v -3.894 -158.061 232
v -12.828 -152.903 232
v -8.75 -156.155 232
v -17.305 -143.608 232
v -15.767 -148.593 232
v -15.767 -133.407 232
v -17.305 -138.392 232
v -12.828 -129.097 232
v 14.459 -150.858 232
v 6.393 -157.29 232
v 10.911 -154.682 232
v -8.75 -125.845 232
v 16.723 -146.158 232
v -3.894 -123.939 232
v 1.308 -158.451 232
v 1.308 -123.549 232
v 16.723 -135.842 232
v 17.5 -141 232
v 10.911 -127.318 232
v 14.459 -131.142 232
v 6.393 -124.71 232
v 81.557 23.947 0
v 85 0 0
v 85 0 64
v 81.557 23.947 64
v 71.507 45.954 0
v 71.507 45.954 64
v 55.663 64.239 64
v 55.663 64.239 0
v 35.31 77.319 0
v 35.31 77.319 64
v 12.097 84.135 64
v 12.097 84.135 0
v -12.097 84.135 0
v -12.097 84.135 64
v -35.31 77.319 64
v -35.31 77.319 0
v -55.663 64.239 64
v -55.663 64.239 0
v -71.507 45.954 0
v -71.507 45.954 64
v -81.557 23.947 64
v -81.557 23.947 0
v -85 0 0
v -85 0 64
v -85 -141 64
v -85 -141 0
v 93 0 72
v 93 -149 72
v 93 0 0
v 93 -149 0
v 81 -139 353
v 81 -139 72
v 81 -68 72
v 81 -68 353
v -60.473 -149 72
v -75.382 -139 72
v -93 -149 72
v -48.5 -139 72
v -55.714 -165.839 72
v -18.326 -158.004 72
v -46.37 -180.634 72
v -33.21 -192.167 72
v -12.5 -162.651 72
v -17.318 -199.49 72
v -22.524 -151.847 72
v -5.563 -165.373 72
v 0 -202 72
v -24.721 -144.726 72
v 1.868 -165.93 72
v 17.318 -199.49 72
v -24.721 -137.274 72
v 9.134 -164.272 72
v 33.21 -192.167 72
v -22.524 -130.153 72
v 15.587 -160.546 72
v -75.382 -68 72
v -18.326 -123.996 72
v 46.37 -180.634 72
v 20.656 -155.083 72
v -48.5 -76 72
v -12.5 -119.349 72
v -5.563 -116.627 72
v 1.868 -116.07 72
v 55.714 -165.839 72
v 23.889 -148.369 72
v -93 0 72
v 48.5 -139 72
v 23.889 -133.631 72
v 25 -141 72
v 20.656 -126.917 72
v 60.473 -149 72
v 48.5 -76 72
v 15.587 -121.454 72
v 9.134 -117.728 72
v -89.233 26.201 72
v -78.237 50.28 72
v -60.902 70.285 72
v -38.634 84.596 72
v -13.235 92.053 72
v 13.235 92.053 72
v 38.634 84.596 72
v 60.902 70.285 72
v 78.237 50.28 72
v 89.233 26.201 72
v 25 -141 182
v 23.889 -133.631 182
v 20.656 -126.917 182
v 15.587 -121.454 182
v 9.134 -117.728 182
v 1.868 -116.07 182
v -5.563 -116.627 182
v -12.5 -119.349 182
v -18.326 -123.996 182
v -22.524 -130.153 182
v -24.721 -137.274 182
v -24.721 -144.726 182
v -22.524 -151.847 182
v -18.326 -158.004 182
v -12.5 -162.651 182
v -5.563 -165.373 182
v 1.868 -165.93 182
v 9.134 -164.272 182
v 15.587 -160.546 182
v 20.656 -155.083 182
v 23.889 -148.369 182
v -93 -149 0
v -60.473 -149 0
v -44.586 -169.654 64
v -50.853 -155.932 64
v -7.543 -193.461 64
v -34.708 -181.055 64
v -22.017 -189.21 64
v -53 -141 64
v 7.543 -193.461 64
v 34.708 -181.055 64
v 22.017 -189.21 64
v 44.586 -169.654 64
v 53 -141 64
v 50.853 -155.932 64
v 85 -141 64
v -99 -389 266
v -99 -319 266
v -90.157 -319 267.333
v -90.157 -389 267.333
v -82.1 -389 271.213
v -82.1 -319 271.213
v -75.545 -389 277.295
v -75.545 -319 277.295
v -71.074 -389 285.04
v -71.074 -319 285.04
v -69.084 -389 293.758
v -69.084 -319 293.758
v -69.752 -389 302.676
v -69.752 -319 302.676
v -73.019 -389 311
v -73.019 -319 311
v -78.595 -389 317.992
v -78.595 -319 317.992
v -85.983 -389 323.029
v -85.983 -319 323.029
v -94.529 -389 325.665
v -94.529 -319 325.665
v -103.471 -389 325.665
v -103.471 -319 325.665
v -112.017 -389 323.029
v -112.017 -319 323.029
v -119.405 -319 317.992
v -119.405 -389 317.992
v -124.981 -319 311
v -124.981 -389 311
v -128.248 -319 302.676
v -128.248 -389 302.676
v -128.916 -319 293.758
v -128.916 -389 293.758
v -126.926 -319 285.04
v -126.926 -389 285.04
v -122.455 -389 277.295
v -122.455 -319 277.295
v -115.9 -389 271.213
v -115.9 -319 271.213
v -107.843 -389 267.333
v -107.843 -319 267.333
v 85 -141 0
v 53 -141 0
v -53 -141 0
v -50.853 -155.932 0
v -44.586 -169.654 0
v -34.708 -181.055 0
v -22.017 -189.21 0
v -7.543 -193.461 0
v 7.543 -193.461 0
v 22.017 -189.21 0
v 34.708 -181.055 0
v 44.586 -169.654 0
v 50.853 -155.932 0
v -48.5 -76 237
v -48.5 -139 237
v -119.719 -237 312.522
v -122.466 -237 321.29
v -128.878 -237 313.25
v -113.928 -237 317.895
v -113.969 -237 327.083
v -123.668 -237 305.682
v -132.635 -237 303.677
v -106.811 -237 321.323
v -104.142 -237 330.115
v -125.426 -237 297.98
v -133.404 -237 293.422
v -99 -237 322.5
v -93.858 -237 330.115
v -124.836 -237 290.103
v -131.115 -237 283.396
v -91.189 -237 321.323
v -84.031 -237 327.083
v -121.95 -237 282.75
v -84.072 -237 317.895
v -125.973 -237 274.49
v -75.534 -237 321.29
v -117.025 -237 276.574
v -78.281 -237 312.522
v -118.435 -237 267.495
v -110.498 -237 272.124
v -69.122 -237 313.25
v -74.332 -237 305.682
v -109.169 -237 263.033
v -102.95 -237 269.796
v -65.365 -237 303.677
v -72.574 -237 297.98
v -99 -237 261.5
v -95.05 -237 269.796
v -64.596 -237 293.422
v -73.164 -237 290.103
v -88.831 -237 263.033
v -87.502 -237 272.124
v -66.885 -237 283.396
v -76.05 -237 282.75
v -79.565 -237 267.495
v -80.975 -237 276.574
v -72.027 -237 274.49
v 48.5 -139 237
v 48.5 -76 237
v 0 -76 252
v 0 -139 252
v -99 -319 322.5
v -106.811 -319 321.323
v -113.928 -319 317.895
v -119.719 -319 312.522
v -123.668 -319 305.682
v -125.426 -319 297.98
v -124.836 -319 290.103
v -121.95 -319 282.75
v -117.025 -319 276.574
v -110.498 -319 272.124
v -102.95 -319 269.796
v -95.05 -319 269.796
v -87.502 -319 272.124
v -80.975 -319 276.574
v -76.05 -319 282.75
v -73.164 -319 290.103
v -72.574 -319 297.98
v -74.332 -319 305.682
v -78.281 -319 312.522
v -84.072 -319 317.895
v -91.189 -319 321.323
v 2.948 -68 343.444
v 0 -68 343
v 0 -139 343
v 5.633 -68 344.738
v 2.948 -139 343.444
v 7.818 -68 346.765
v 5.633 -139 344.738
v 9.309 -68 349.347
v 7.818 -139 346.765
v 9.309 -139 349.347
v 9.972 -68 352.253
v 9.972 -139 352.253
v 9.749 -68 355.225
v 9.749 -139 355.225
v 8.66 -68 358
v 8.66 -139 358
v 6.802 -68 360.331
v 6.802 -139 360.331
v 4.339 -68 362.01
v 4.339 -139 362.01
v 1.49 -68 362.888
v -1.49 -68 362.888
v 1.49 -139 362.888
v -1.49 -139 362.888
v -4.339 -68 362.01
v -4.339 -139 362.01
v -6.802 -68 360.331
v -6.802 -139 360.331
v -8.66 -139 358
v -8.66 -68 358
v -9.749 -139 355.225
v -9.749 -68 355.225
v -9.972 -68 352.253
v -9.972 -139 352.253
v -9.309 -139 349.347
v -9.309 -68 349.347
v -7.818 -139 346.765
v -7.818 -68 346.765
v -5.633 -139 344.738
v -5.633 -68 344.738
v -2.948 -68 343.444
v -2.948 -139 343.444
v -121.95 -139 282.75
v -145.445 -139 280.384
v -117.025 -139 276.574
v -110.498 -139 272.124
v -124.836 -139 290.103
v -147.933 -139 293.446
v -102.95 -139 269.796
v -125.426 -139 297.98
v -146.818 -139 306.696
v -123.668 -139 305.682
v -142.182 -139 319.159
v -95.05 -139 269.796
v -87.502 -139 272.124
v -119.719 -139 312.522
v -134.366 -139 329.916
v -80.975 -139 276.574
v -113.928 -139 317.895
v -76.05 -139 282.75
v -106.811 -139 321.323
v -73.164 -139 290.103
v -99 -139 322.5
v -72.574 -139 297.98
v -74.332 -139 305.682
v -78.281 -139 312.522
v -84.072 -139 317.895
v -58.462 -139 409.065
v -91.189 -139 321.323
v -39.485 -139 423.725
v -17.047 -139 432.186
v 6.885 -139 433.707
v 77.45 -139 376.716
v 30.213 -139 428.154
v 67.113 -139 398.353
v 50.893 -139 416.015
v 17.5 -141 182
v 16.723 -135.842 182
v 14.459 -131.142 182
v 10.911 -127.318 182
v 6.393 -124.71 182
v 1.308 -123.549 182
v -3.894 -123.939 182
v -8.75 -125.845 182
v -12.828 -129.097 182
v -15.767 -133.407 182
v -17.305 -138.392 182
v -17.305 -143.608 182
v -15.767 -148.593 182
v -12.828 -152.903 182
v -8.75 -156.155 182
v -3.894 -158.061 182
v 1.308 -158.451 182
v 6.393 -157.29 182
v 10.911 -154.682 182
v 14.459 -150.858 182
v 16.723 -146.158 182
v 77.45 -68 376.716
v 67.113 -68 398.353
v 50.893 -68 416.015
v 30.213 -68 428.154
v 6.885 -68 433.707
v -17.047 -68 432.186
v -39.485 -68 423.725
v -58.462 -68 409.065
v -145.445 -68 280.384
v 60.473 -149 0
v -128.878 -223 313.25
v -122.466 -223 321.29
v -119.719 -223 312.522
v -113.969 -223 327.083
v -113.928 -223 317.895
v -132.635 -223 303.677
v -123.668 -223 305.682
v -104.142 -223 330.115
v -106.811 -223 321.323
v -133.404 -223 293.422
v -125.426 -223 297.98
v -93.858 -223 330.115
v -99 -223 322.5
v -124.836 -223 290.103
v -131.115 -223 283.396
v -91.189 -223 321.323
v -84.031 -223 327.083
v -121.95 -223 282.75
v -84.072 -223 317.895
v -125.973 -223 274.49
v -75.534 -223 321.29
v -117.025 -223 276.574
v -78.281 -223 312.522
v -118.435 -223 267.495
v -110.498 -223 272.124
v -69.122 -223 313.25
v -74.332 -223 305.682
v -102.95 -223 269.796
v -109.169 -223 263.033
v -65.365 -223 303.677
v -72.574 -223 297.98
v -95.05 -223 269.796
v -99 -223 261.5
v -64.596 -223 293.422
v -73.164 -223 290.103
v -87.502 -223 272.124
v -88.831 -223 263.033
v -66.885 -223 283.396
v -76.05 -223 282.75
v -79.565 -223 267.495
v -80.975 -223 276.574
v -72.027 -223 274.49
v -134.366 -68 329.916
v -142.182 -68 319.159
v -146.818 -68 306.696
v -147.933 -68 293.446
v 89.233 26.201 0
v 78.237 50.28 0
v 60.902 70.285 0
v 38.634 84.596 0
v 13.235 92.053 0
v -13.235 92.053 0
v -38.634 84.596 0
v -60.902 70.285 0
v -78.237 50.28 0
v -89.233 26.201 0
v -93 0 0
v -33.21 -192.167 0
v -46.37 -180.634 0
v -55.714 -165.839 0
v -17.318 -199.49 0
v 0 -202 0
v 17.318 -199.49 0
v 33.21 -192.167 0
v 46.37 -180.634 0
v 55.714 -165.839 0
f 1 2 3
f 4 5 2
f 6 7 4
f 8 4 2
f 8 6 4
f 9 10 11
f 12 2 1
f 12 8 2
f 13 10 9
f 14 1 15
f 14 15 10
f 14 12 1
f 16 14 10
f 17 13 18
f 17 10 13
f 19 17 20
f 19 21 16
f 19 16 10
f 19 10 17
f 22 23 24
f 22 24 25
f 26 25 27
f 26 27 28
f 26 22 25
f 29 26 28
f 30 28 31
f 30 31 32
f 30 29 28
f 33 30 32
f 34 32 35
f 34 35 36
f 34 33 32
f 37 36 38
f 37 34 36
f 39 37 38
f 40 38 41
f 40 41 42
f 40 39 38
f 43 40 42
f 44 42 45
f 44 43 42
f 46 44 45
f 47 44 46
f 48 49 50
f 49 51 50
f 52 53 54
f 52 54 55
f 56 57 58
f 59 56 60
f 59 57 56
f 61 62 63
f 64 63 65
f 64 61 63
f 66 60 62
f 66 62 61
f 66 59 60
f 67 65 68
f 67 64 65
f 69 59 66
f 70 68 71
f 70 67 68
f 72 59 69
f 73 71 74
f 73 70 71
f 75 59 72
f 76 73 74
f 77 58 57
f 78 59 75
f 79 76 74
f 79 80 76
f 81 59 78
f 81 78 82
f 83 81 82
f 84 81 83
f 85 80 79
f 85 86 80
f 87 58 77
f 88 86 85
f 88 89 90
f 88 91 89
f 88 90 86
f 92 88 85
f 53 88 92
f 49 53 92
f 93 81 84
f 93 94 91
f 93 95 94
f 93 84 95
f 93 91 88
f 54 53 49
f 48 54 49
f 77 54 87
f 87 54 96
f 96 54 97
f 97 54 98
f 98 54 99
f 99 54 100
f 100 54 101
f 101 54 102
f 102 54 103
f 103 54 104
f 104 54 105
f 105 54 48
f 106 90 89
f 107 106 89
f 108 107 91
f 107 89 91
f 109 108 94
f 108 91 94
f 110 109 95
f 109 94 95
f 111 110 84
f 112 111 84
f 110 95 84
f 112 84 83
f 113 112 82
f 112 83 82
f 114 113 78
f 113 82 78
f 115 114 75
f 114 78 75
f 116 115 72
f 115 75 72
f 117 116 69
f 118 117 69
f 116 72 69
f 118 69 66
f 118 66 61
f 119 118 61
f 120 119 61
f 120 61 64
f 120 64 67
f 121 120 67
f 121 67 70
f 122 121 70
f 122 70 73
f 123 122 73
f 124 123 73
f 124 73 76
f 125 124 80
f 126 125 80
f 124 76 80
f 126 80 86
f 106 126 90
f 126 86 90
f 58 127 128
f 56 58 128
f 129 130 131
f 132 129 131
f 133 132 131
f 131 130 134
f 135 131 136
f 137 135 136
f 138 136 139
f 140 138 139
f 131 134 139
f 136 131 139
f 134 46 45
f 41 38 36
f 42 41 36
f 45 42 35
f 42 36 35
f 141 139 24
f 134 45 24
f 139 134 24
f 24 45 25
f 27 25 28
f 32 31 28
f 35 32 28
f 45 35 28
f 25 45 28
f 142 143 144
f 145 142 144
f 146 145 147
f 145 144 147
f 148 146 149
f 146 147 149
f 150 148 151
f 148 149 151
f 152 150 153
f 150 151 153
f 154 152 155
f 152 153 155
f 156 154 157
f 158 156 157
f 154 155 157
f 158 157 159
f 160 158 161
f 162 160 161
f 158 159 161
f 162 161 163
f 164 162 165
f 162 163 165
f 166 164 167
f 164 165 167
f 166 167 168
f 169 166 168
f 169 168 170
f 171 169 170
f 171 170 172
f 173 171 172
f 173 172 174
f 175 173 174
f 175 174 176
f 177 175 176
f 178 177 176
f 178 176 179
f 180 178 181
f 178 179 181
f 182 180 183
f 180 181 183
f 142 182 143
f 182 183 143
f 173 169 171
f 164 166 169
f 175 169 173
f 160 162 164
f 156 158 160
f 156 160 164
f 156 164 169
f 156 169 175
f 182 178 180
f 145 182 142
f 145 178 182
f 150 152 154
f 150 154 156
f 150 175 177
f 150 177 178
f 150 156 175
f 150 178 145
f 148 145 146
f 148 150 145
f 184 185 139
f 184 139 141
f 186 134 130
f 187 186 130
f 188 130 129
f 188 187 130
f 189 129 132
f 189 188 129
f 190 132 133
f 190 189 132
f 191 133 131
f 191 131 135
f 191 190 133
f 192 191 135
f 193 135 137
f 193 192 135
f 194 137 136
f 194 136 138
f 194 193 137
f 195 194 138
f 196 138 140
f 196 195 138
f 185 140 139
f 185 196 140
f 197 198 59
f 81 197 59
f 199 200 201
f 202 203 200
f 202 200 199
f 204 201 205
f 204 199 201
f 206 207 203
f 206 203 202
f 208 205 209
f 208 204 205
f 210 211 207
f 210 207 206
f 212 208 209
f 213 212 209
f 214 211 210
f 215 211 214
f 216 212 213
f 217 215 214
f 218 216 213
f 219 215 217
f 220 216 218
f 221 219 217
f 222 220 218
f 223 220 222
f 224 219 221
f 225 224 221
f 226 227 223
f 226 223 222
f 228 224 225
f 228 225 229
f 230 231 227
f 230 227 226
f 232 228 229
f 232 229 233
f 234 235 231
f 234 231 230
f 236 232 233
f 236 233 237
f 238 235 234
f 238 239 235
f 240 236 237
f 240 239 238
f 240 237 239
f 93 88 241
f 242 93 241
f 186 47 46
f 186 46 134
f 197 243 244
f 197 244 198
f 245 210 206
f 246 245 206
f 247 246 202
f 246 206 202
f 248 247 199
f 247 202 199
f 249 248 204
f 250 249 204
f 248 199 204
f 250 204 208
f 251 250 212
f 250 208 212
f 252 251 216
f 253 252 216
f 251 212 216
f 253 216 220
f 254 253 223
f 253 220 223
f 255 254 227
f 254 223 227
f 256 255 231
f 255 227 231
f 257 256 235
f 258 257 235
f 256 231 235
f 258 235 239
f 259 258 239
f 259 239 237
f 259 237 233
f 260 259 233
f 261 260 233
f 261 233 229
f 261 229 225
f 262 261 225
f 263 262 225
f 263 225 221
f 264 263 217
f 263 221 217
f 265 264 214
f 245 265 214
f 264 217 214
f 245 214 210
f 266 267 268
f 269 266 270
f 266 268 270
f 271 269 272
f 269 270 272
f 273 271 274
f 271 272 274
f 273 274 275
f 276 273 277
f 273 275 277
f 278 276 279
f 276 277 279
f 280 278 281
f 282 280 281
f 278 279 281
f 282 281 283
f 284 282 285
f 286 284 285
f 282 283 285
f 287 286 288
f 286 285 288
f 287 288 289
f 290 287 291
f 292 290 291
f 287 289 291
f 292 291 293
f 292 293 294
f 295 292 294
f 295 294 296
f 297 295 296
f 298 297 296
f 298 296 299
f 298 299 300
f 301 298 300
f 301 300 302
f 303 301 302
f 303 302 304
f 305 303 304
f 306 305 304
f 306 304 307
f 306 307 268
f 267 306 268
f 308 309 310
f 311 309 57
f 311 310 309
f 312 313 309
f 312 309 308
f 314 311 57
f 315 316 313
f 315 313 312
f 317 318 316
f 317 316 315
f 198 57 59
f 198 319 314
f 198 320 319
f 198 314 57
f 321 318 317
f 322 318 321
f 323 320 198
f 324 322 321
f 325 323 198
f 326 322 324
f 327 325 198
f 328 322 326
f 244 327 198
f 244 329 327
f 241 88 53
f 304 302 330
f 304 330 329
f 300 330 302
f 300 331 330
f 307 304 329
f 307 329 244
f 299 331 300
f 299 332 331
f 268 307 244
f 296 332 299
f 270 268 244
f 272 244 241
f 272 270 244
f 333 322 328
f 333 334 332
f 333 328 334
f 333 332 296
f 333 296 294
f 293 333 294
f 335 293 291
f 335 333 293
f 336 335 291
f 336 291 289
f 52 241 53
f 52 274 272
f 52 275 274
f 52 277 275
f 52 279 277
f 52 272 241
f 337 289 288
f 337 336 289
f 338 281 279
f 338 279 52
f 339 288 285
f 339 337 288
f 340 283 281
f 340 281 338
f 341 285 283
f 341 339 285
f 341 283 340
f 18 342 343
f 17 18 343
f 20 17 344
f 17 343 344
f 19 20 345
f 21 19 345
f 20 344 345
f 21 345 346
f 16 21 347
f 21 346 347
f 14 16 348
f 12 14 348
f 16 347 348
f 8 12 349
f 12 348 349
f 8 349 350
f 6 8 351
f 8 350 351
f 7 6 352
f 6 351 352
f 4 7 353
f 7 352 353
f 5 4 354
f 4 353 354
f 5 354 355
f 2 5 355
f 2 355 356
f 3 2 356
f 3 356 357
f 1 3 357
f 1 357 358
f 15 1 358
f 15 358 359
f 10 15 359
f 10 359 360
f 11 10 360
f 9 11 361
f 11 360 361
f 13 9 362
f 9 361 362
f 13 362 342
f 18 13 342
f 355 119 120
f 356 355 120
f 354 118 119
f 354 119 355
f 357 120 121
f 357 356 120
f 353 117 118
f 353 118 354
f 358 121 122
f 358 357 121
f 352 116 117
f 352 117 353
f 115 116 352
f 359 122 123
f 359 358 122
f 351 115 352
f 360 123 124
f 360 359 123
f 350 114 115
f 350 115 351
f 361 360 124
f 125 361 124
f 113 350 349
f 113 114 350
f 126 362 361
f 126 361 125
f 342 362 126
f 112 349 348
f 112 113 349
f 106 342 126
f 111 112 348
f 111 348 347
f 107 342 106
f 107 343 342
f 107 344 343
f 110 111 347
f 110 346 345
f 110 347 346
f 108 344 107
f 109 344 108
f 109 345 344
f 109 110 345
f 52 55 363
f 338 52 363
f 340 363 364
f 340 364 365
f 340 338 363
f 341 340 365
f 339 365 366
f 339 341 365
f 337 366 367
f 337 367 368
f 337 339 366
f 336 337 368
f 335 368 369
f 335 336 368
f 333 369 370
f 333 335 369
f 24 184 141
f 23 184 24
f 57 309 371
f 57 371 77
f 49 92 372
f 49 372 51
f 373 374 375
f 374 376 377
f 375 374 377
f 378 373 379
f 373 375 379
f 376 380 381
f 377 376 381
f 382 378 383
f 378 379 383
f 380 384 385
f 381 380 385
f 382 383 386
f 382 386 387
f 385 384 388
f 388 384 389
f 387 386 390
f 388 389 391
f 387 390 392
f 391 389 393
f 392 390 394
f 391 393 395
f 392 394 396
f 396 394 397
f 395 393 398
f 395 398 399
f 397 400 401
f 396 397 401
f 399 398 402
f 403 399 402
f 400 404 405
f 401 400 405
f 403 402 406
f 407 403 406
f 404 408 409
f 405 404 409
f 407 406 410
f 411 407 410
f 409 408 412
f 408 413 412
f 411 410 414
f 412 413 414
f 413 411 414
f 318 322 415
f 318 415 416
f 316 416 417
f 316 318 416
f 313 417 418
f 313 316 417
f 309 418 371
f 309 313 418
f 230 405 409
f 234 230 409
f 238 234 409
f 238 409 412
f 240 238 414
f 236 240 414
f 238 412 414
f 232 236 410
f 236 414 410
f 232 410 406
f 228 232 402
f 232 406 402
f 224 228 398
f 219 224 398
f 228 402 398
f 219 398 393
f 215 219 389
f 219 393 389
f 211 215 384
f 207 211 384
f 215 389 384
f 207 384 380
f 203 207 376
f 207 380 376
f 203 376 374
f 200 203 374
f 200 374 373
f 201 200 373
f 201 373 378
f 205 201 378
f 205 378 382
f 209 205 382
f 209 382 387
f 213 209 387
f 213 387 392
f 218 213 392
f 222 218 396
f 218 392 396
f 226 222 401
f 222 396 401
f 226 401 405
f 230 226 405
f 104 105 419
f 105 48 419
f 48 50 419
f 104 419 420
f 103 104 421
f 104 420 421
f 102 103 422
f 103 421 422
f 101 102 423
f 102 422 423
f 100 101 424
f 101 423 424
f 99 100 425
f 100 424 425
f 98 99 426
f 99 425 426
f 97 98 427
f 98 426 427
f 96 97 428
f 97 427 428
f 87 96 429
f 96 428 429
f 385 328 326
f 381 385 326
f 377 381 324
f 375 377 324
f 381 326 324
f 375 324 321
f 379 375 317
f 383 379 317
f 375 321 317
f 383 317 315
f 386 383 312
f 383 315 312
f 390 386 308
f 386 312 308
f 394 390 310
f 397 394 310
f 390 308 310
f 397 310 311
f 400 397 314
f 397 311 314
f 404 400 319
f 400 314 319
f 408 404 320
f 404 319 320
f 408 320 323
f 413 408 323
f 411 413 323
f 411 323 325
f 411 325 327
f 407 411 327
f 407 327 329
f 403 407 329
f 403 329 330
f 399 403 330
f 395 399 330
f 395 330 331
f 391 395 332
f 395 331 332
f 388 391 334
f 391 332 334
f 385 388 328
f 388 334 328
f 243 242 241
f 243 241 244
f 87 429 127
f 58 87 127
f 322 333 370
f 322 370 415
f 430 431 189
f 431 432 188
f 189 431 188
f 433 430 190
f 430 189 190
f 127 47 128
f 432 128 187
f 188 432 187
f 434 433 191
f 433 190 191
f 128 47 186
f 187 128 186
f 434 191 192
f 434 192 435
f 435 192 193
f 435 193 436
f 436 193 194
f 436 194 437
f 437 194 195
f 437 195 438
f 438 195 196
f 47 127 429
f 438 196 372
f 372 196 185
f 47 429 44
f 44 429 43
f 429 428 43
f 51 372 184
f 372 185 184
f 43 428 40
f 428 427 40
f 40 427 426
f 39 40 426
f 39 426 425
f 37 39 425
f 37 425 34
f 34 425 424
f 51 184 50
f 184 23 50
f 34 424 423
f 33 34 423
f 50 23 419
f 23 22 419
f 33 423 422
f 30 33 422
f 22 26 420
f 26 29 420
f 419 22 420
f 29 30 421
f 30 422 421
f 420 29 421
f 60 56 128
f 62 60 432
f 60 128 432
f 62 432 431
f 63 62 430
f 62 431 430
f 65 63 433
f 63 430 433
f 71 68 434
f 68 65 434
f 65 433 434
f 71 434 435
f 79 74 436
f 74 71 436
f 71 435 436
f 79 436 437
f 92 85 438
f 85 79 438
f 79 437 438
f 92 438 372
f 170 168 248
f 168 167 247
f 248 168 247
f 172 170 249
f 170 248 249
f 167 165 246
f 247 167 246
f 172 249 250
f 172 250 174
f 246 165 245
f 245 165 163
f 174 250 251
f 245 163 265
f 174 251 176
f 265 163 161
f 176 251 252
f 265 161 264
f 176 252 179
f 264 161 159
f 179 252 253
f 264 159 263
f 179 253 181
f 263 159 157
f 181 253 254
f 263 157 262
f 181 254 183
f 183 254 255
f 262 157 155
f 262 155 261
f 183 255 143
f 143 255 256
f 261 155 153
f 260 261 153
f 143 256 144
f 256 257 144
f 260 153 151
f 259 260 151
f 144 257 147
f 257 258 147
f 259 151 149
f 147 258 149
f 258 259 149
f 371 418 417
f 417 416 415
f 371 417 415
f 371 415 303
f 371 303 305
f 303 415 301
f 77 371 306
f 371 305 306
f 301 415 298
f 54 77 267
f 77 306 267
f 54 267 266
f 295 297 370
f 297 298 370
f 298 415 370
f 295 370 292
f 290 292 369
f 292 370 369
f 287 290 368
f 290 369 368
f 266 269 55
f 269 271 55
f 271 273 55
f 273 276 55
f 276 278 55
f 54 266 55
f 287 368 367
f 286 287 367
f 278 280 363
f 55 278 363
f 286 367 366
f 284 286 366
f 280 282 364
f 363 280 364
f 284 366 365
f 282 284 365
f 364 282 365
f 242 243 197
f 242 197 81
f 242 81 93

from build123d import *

# Parameters (mm, degrees)
EXTRUSION1_DEPTH        = 64
COQUE14_T               = 8
EXTRUSION2_DEPTH        = 71
ENL_V_MAT_EXTRU_1_DEPTH = 65
ESQUISSE8_R             = 26.5
EXTRUSION3_DEPTH        = 84
ESQUISSE9_R             = 34.5
EXTRUSION4_DEPTH        = 14
ESQUISSE10_R            = 26.5
EXTRUSION5_DEPTH        = 82
ESQUISSE11_R            = 30
EXTRUSION6_DEPTH        = 70
ESQUISSE12_R            = 25
EXTRUSION7_DEPTH        = 110
ESQUISSE13_R            = 17.5
EXTRUSION8_DEPTH        = 50
ESQUISSE14_R            = 10
ENL_V_MAT_EXTRU_2_DEPTH = 523.264300905


with BuildPart() as part:
    # Esquisse1 → Extrusion1 (new body)
    with BuildSketch(Plane.XY):
        with BuildLine():
            Line((53, -141), (85, -141))
            Line((85, -141), (85, 0))
            ThreePointArc((85, 0), (0, 85), (-85, 0))
            Line((-85, 0), (-85, -141))
            Line((-85, -141), (-53, -141))
            ThreePointArc((-53, -141), (0, -194), (53, -141))
        make_face()
    extrude(amount=EXTRUSION1_DEPTH)

    # Coque14
    coque14_openings = [part.faces().sort_by_distance(p)[0] for p in [
        (0, -50.38495727, 0),
    ]]
    offset(amount=COQUE14_T, openings=coque14_openings, kind=Kind.INTERSECTION)

    # Esquisse2 → Extrusion2 (add)
    with BuildSketch(Plane(origin=(0, -139, 0), x_dir=(-1, 0, 0), z_dir=(0, 1, 0))):
        with BuildLine():
            Line((-81, 72), (-81, 353))
            ThreePointArc((-81, 353), (-30.212730552, 428.154447058), (58.461504015, 409.0647175))
            Line((58.461504015, 409.0647175), (134.365601194, 329.915693302))
            ThreePointArc((134.365601194, 329.915693302), (146.818305394, 306.69624557), (145.44507462, 280.384141281))
            Line((145.44507462, 280.384141281), (75.381729126, 72))
            Line((75.381729126, 72), (-81, 72))
        make_face()
    extrude(amount=EXTRUSION2_DEPTH)

    # Esquisse4 → Enlèv. mat.-Extru.1 (cut)
    with BuildSketch(Plane(origin=(-53, -141, 64), x_dir=(1, 0, 0), z_dir=(0, -1, 0))):
        Polygon((101.5, 8), (101.5, 173), (53, 188), (4.5, 173), (4.5, 8), align=None)
    extrude(amount=-ENL_V_MAT_EXTRU_1_DEPTH, mode=Mode.SUBTRACT)

    # Esquisse8 → Extrusion3 (add)
    with BuildSketch(Plane.XZ.offset(139)):
        with Locations(Location((-99, 296, 0), (0, 0, 90))):
            Circle(ESQUISSE8_R)
    extrude(amount=EXTRUSION3_DEPTH)

    # Esquisse9 → Extrusion4 (add)
    with BuildSketch(Plane.XZ.offset(223)):
        with Locations(Location((-99, 296, 0), (0, 0, 270))):
            Circle(ESQUISSE9_R)
    extrude(amount=EXTRUSION4_DEPTH)

    # Esquisse10 → Extrusion5 (add)
    with BuildSketch(Plane.XZ.offset(237)):
        with Locations(Location((-99, 296, 0), (0, 0, 90))):
            Circle(ESQUISSE10_R)
    extrude(amount=EXTRUSION5_DEPTH)

    # Esquisse11 → Extrusion6 (add)
    with BuildSketch(Plane.XZ.offset(319)):
        with Locations(Location((-99, 296, 0), (0, 0, 270))):
            Circle(ESQUISSE11_R)
    extrude(amount=EXTRUSION6_DEPTH)

    # Esquisse12 → Extrusion7 (add)
    with BuildSketch(Plane.XY.offset(72)):
        with Locations((0, -141)):
            Circle(ESQUISSE12_R)
    extrude(amount=EXTRUSION7_DEPTH)

    # Esquisse13 → Extrusion8 (add)
    with BuildSketch(Plane.XY.offset(182)):
        with Locations((0, -141)):
            Circle(ESQUISSE13_R)
    extrude(amount=EXTRUSION8_DEPTH)

    # Esquisse14 → Enlèv. mat.-Extru.2 (cut, through all)
    with BuildSketch(Plane.XZ.offset(139)):
        with Locations(Location((0, 353, 0), (0, 0, 270))):
            Circle(ESQUISSE14_R)
    extrude(amount=-ENL_V_MAT_EXTRU_2_DEPTH, mode=Mode.SUBTRACT)


solid = part.part
